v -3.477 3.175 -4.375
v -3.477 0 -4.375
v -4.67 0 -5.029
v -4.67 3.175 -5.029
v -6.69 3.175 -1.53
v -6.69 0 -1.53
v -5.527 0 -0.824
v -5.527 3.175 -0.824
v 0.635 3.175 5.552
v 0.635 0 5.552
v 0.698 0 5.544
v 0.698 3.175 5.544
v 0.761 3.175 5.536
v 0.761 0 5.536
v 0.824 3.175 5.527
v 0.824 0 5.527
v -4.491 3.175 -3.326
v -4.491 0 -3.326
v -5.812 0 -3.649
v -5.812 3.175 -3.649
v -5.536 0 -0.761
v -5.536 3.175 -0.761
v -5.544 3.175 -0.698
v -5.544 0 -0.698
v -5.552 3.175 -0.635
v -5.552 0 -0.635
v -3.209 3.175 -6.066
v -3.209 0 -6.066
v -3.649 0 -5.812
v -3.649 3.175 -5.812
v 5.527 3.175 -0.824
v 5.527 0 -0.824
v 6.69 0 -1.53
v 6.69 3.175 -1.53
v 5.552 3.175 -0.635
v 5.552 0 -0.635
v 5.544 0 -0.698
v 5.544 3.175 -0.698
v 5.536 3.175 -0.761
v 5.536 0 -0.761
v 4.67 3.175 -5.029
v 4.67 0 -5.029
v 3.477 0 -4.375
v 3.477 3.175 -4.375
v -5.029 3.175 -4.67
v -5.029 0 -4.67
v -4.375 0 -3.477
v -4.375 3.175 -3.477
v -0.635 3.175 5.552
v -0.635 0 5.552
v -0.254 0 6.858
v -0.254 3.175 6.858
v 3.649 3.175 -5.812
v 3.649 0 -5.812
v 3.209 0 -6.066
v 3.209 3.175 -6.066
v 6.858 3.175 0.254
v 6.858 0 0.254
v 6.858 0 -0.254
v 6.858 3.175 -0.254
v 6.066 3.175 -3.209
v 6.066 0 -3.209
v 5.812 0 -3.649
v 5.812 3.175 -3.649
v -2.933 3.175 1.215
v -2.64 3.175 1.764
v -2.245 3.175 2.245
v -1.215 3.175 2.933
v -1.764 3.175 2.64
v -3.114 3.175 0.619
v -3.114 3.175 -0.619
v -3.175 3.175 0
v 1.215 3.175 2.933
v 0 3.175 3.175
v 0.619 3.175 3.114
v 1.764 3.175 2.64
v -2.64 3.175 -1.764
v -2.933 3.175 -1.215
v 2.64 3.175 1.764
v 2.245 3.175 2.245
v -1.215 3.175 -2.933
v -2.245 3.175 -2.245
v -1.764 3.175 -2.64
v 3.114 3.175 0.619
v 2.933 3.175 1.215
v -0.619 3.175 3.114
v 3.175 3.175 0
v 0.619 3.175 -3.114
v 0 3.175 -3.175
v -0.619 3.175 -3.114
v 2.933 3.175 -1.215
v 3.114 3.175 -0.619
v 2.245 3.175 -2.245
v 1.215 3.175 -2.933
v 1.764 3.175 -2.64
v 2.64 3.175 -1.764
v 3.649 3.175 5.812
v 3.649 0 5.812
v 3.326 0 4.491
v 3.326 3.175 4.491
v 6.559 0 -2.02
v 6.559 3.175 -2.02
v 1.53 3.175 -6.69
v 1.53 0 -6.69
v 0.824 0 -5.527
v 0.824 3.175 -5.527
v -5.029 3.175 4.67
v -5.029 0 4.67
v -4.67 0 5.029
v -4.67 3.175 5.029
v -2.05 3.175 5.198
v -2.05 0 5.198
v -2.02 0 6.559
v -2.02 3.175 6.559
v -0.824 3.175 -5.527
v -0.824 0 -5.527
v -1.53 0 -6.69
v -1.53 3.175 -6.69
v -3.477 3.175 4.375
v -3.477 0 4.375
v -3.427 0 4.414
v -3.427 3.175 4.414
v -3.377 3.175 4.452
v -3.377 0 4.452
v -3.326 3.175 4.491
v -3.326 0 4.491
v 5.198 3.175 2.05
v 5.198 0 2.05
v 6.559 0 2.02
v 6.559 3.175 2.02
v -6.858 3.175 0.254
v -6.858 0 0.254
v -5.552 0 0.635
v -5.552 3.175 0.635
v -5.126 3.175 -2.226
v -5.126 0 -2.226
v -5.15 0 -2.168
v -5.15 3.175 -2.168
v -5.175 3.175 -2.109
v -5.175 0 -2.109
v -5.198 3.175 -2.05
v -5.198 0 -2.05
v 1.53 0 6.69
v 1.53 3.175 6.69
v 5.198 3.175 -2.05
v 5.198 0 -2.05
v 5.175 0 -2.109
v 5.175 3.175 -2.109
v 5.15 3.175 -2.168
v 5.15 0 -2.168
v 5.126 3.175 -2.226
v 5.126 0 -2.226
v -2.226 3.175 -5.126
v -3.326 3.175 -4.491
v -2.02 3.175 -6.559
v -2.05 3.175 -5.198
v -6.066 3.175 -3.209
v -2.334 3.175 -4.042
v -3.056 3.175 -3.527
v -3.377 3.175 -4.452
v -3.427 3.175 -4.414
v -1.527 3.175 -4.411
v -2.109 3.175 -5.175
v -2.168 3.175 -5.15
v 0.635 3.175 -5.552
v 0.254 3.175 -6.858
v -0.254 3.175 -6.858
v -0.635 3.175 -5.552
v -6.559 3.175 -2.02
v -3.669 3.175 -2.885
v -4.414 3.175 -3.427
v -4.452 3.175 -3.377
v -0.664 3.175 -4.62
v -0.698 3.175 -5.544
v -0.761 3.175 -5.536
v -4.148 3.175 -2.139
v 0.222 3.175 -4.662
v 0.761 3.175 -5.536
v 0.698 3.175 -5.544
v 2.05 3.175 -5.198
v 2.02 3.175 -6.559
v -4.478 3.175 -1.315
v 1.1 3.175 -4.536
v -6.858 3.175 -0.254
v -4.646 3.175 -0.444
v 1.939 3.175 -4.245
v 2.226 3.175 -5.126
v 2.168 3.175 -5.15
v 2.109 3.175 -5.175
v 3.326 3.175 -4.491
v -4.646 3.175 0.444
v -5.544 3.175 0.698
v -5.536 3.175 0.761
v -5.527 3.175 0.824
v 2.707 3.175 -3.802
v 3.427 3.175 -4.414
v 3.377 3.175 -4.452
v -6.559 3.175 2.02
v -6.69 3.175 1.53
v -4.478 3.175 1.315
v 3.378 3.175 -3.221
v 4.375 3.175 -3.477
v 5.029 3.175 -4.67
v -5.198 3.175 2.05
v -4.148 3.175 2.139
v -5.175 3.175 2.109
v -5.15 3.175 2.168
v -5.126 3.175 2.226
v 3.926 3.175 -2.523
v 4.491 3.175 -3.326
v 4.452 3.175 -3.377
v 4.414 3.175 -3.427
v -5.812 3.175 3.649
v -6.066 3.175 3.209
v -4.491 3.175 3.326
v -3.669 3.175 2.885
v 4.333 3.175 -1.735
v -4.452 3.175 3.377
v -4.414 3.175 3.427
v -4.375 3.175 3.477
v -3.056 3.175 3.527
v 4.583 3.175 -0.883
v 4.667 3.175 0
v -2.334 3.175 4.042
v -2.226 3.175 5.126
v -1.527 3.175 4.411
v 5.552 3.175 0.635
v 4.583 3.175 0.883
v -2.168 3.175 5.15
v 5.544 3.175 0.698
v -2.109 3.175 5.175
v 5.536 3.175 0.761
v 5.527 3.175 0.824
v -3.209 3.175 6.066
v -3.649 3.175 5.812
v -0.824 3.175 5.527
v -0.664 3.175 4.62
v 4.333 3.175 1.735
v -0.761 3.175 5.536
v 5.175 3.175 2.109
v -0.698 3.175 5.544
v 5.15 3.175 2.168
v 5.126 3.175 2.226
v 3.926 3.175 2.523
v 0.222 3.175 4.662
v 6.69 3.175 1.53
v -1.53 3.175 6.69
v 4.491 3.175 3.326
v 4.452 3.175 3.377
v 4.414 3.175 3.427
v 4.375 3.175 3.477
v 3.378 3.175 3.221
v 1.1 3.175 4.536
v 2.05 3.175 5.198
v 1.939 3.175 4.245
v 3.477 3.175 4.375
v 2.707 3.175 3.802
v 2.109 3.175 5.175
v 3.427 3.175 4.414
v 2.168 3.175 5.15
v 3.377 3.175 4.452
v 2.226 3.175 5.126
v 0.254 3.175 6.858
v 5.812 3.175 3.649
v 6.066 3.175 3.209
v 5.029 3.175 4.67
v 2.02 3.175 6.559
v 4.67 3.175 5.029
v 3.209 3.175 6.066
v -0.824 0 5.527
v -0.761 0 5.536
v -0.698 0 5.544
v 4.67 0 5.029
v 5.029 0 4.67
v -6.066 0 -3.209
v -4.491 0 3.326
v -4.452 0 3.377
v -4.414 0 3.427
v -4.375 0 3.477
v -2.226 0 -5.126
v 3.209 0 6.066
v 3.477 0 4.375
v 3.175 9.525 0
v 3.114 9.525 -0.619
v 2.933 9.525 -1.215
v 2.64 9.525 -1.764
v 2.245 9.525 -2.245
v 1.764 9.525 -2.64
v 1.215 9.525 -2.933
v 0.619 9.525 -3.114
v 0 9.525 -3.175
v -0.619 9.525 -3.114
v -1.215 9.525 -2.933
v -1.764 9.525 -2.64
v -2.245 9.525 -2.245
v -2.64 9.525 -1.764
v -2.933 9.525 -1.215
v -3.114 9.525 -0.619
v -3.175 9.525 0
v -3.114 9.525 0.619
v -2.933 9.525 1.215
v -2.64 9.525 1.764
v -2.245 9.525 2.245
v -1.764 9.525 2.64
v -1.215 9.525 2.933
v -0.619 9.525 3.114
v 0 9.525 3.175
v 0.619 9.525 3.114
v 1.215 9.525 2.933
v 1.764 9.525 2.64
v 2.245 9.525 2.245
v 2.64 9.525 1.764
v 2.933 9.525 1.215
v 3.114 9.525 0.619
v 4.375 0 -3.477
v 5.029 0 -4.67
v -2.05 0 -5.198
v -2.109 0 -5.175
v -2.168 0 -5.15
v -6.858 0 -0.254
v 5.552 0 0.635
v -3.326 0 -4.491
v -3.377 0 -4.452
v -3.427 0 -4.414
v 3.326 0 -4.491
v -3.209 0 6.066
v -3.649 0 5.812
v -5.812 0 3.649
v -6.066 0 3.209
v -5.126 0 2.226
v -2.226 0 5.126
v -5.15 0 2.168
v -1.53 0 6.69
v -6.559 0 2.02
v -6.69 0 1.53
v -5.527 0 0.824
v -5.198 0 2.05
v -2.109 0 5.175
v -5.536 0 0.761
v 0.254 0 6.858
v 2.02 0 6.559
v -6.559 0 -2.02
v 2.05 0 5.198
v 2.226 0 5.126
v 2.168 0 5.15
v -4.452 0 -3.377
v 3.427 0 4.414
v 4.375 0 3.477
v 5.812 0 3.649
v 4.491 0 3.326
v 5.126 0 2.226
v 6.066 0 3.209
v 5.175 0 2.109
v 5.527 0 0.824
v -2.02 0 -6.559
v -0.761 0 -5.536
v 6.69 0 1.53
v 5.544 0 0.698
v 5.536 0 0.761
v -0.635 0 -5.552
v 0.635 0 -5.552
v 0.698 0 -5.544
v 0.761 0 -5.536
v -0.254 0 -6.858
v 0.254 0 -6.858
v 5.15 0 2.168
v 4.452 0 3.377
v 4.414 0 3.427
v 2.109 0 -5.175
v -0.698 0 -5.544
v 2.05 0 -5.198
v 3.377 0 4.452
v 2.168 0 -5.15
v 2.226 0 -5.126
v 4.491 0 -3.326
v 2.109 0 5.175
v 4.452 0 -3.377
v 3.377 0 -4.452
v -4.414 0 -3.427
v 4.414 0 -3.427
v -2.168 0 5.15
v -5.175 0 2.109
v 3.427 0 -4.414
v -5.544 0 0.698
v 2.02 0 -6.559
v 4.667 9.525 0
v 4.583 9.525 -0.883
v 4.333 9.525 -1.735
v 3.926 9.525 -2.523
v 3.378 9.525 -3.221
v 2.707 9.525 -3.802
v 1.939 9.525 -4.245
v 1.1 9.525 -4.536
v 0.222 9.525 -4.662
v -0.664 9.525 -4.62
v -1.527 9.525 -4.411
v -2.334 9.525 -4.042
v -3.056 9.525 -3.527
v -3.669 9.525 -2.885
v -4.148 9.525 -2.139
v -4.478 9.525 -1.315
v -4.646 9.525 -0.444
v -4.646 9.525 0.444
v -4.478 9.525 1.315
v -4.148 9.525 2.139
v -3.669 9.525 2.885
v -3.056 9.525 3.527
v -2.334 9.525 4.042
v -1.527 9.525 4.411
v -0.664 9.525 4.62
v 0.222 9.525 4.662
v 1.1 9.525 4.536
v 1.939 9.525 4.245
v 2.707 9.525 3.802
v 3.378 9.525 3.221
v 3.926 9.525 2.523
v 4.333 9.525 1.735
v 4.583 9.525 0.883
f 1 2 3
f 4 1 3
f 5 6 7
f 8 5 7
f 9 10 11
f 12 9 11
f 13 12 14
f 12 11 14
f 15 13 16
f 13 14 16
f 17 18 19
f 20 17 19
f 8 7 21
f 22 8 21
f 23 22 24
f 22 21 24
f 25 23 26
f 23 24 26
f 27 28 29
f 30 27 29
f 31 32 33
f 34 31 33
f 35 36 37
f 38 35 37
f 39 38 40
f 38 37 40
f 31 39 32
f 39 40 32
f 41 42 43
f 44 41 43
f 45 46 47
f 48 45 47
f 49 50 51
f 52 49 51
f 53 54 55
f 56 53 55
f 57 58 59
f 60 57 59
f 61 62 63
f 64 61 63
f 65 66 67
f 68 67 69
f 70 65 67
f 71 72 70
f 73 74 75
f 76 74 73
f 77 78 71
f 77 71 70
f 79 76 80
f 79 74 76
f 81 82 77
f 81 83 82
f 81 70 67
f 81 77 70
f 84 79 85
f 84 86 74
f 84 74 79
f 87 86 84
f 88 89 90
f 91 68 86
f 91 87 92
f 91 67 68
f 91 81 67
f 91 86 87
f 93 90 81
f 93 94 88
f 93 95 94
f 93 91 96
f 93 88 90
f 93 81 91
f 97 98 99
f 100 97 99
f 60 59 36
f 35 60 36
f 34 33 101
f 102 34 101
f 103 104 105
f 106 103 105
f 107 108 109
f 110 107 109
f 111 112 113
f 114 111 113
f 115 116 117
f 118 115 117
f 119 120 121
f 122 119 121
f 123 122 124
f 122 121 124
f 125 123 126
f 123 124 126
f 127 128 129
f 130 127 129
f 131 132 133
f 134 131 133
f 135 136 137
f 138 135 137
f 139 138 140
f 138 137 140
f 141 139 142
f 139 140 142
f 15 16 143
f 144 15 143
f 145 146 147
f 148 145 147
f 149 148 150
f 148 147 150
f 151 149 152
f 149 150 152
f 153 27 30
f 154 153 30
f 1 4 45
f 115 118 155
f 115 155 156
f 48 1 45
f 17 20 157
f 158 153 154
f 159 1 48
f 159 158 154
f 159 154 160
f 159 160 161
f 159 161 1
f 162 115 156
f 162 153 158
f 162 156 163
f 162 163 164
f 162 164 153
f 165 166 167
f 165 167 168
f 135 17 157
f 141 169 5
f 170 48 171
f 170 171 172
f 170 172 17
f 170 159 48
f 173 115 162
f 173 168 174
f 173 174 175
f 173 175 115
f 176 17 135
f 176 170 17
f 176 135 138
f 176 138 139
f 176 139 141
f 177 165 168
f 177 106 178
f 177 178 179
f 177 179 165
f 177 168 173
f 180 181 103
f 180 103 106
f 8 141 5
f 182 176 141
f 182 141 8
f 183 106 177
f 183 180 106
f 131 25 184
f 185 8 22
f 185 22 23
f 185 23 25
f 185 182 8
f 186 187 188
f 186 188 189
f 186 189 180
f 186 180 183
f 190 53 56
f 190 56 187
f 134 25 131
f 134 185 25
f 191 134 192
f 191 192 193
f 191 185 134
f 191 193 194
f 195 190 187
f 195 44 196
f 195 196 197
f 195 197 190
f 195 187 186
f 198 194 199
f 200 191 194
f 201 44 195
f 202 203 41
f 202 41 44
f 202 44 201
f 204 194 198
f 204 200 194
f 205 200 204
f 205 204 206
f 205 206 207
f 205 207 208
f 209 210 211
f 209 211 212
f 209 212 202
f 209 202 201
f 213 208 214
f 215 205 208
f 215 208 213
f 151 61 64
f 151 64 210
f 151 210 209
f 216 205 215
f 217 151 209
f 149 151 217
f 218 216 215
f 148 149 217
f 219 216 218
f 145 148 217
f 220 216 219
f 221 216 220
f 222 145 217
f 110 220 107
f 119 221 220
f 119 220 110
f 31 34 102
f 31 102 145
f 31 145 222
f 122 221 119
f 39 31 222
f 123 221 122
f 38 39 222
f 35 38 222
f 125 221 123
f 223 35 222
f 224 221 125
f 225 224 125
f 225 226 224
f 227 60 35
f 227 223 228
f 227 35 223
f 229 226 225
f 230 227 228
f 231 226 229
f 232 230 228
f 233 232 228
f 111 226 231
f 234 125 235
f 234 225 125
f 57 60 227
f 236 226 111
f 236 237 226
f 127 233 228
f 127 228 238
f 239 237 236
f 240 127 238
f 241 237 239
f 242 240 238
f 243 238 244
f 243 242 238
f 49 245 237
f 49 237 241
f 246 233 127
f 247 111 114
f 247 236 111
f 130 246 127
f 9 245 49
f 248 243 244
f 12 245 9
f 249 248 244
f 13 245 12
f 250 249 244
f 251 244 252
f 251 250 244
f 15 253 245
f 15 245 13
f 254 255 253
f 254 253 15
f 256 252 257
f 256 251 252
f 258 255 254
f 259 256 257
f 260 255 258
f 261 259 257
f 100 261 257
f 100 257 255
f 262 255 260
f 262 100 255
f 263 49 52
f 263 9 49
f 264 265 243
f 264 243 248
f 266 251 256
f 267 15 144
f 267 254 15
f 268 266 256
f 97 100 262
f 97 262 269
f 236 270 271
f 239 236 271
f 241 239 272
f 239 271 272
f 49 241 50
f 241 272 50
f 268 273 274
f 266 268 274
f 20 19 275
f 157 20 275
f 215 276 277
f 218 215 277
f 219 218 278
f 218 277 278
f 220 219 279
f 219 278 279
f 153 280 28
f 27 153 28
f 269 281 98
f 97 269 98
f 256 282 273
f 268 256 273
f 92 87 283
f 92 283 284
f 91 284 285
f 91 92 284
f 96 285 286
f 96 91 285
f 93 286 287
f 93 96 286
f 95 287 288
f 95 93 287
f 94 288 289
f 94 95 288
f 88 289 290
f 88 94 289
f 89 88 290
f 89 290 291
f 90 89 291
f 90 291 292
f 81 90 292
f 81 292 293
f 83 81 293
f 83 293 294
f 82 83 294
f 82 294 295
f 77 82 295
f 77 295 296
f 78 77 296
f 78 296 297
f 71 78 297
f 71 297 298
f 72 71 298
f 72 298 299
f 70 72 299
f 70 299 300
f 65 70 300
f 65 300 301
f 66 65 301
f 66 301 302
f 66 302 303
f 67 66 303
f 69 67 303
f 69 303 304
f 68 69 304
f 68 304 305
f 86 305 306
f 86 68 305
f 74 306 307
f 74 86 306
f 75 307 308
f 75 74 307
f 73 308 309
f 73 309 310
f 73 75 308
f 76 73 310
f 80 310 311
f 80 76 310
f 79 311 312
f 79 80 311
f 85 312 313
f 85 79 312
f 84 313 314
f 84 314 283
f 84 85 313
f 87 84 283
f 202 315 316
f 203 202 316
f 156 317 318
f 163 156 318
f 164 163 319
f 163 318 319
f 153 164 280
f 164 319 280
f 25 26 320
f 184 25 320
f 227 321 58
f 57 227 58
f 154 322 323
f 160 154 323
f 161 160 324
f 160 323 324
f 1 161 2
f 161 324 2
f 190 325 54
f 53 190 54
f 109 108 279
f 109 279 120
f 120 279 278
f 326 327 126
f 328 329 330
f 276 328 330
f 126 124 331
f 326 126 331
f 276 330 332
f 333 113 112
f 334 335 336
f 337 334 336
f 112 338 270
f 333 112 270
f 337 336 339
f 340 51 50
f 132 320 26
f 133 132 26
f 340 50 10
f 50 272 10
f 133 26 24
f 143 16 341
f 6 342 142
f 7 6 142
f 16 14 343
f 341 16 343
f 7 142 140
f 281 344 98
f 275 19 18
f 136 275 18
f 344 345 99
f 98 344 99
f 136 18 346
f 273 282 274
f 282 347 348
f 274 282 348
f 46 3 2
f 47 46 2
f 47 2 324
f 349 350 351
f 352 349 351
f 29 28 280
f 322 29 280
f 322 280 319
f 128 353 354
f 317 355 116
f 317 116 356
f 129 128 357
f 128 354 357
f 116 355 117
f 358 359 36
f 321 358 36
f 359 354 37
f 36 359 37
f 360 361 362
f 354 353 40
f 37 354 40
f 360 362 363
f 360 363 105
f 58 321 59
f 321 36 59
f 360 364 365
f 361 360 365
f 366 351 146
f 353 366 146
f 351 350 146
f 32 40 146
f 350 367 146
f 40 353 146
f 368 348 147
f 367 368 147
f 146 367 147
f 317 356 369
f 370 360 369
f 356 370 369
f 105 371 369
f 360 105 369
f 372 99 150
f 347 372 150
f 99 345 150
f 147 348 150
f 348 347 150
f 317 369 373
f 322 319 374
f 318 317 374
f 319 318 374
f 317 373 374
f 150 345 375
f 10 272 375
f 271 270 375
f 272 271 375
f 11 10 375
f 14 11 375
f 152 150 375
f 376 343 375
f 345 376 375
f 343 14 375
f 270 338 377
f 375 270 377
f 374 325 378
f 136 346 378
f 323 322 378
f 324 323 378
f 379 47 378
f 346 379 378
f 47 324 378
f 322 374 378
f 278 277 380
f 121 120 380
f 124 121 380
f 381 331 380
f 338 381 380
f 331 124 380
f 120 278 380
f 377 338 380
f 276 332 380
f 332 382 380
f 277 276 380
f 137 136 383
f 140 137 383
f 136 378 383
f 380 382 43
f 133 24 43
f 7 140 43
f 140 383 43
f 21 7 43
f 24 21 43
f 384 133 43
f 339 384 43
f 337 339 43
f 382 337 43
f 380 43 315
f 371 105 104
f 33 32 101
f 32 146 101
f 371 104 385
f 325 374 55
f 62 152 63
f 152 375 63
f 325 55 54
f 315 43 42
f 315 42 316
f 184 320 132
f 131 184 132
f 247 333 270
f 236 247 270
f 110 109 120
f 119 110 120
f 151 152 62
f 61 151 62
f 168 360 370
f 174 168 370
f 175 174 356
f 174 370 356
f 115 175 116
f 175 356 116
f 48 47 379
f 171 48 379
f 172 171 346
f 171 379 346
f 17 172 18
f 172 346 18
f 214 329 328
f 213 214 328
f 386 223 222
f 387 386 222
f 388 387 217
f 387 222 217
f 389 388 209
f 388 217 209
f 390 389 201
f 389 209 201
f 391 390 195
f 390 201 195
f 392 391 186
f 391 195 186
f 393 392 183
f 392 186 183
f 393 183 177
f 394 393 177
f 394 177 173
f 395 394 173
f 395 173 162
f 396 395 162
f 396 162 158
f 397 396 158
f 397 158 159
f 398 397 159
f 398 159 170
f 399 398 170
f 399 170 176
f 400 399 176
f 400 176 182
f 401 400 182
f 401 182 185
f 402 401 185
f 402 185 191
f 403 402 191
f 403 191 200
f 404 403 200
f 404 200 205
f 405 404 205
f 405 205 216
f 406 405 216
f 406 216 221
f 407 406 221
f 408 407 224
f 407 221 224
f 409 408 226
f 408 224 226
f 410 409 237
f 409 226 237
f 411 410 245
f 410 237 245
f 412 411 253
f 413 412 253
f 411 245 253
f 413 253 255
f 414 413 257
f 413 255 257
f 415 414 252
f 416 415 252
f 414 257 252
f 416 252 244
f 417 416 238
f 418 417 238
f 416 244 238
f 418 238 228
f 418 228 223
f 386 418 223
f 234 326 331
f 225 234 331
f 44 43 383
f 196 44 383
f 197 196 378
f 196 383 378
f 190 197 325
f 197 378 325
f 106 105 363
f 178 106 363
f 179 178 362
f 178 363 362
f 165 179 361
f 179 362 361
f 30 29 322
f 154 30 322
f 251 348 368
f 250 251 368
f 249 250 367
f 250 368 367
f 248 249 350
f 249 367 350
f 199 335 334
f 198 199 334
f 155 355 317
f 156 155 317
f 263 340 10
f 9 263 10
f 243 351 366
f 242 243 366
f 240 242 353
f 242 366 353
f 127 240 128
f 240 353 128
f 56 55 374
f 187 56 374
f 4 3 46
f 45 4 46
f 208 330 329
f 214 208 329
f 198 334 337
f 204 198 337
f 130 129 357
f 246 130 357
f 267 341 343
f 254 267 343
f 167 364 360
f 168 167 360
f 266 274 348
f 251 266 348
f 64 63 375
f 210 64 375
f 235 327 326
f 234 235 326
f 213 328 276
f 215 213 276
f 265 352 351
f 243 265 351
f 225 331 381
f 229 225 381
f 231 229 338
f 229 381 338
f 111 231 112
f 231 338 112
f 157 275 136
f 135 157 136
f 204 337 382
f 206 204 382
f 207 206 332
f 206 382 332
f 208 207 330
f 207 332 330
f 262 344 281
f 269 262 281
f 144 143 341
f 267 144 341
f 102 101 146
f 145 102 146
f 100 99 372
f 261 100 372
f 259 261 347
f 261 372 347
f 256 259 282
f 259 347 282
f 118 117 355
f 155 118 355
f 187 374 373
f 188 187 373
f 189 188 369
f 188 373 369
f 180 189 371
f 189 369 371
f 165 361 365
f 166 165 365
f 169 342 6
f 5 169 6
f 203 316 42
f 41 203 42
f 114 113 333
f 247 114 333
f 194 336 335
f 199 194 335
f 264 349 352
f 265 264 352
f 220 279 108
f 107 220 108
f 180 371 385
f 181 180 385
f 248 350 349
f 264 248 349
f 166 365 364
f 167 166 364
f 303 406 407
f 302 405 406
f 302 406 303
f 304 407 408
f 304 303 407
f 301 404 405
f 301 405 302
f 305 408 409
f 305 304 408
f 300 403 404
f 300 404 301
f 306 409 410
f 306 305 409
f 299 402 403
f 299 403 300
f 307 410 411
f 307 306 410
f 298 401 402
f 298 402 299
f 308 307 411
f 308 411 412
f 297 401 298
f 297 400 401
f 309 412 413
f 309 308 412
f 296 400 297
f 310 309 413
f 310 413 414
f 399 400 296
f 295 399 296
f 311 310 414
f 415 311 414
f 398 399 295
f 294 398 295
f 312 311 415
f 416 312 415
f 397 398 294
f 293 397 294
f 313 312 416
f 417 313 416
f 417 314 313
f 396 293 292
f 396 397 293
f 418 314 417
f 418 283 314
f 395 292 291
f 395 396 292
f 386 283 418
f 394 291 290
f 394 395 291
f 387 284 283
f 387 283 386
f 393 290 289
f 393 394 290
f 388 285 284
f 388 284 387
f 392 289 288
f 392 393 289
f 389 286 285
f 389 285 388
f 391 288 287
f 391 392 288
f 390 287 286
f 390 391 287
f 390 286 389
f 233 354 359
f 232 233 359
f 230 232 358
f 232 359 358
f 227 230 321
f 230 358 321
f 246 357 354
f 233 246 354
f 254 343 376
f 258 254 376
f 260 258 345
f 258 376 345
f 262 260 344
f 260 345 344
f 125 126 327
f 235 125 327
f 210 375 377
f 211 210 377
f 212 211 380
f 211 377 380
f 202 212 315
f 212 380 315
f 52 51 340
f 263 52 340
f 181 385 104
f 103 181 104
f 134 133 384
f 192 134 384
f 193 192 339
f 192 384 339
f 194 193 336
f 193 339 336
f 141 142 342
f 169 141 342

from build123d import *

# Parameters (mm, degrees)
SKETCH1_R           = 4.66725
SKETCH1_R_2         = 3.175
BOSS_EXTRUDE1_DEPTH = 9.525
BOSS_EXTRUDE2_DEPTH = 3.175
BOSS_EXTRUDE3_DEPTH = 3.175
CIRPATTERN1_COUNT   = 24


with BuildPart() as part:
    # Sketch1 → Boss-Extrude1 (new body)
    with BuildSketch(Plane(origin=(0, 0, 0), x_dir=(1, 0, 0), z_dir=(0, 1, 0))):
        Circle(SKETCH1_R)
        Circle(SKETCH1_R_2, mode=Mode.SUBTRACT)
    extrude(amount=BOSS_EXTRUDE1_DEPTH)

    # Sketch2 → Boss-Extrude2 (add)
    with BuildSketch(Plane(origin=(0, 0, 0), x_dir=(1, 0, 0), z_dir=(0, 1, 0))):
        with BuildLine():
            Line((0.635, 5.551803221), (-0.635, 5.551803221))
            ThreePointArc((-0.635, 5.551803221), (-3.720037903, -4.16977961), (5.588, 0))
            ThreePointArc((5.588, 0), (4.16977961, 3.720037903), (0.635, 5.551803221))
        make_face()
    extrude(amount=BOSS_EXTRUDE2_DEPTH)

    # Sketch2<3> → Boss-Extrude3 (add)
    with BuildSketch(Plane(origin=(0, 0, 0), x_dir=(1, 0, 0), z_dir=(0, 1, 0))):
        Polygon((-0.635, 5.551803221), (0.635, 5.551803221), (0.254, 6.858), (-0.254, 6.858), align=None)
    boss_extrude3 = extrude(amount=BOSS_EXTRUDE3_DEPTH)

    # CirPattern1: Boss-Extrude3 ×24 about axis
    cirpattern1_axis = Axis((0, 9.525, 0), (0, -1, 0))
    for i in range(1, CIRPATTERN1_COUNT):
        add(boss_extrude3.rotate(cirpattern1_axis, i * 360 / CIRPATTERN1_COUNT))


solid = part.part
